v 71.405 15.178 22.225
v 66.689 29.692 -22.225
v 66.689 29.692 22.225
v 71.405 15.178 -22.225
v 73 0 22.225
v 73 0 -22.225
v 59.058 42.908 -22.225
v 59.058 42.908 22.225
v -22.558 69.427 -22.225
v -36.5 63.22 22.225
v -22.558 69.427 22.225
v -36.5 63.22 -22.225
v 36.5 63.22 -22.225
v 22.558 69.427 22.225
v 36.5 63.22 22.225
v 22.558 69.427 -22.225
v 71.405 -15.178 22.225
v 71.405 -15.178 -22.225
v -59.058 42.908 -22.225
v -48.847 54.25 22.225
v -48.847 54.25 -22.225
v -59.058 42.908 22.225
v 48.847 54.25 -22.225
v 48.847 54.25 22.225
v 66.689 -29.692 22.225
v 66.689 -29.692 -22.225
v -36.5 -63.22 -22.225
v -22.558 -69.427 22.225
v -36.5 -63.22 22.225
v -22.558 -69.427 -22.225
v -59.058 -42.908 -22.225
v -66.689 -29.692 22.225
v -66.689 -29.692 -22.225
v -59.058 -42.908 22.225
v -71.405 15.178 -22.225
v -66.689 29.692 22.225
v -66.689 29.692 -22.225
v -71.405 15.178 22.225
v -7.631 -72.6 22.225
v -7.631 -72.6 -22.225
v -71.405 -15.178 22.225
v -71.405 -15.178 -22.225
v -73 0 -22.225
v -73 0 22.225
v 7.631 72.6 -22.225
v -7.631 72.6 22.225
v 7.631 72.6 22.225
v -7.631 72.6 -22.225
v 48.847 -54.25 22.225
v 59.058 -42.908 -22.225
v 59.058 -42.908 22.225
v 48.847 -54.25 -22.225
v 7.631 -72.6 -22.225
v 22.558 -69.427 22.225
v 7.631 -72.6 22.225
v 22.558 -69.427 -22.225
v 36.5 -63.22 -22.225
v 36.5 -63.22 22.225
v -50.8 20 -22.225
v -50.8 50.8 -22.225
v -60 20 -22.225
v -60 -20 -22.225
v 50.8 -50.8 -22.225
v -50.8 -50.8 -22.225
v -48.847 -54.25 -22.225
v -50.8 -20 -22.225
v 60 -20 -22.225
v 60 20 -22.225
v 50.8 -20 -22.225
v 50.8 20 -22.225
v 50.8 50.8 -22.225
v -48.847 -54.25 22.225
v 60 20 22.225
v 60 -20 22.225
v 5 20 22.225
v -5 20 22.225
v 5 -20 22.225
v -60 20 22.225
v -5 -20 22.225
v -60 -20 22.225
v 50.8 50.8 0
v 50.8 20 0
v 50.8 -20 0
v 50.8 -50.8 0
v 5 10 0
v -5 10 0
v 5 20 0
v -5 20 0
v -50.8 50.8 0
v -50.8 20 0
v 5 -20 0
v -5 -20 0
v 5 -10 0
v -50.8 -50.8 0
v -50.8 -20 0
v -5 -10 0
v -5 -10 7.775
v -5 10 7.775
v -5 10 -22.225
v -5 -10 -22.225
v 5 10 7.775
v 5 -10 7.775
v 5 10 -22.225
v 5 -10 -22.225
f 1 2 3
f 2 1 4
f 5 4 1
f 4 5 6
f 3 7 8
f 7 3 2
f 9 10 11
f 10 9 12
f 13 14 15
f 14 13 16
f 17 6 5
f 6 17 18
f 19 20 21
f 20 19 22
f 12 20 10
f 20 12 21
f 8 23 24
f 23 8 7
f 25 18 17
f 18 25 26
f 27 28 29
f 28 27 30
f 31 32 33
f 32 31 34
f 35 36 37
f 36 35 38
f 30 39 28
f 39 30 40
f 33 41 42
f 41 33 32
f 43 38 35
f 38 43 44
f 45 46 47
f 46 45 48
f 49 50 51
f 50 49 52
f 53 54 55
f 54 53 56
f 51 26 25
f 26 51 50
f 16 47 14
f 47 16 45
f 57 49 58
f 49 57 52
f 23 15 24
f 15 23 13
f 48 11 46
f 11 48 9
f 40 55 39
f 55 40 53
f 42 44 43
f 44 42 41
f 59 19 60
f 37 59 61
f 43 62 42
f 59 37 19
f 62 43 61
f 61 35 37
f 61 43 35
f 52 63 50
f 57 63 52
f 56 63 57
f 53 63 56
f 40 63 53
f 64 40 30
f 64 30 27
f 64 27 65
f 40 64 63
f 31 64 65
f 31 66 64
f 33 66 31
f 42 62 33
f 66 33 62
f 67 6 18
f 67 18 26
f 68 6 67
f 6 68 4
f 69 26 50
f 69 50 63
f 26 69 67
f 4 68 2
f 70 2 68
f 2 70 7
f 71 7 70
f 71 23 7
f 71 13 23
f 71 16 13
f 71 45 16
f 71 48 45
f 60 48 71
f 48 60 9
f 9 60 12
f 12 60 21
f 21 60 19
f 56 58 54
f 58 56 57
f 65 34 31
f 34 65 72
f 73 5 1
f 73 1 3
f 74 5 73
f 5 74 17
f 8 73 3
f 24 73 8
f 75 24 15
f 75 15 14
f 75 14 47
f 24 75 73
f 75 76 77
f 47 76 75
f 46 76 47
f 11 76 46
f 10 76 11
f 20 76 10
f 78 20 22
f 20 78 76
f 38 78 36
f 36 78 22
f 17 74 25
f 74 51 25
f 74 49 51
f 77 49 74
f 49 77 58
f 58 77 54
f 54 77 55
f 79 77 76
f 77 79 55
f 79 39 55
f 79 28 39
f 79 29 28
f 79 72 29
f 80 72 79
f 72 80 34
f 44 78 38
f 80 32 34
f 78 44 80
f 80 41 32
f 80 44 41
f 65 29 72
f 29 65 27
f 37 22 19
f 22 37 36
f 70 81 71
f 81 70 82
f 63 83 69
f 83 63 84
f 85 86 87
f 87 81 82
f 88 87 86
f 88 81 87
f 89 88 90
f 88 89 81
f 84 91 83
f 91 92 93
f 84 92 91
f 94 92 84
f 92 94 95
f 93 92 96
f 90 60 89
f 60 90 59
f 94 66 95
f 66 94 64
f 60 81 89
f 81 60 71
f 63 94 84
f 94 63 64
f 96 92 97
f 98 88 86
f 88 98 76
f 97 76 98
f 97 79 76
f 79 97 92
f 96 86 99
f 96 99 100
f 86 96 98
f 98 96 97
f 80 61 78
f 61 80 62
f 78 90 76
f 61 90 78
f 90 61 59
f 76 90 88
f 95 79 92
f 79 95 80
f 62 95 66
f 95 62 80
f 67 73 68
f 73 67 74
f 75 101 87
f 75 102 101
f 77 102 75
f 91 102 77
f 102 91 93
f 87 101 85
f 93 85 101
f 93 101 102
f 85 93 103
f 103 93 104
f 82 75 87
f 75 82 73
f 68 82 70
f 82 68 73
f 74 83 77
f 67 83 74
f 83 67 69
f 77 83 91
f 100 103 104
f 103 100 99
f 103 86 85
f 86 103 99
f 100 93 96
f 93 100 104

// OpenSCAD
//main body
difference(){
    
    cylinder(44.45,73,73,true);
    // square hole in middle
    translate([0,0,-22.225])
        cube([101.6,101.6,44.45], true);
    //square extension L
    translate([-60, -20, -44.45])
    cube([55,40,88.9], false);
    //square extension R
    translate([5, -20, -44.45])
        cube([55,40,88.9], false);
    //another hole in the middle
    //cube([70,50,45], true);
    /*hole 1 in corner
    translate([-38, -38, 0])
        cylinder(500, 12, 12, true);
    //hole 2 in corner
    translate([-38, 38, 0])
        cylinder(500, 12, 12, true);
    //hole 3 in corner
    translate([38, -38, 0])
        cylinder(500, 12, 12, true);
    //hole 4 in corner
    translate([38, 38, 0])
        cylinder(500, 12, 12, true);*/
}
//center motor mounter
translate([-5, -10, -22.225])
    cube([10, 20, 30], false);
/*main motor left
rotate([0,90,0])
    translate([15, 0, -25.45])
cylinder(40.9, 8, 8, true);
//main motor right
rotate([0,90,0])
    translate([15, 0, 25.45])
cylinder(40.9, 8, 8, true);
/*motor turnything left
rotate([90,0,0])
    translate([0,-75, -185]) 
    cylinder(40, 10, 10, $fn=6, true);
//motor turnything right
rotate([90,0,0])
    translate([0,-75, 185]) 
    cylinder(40, 10, 10, $fn=6, true);
//wheel left
rotate([0, 90, 0])
    translate([15, 0, -51])
    cylinder(11.303, 19.05, 19.05, true);
//wheel left
rotate([0, 90, 0])
    translate([15, 0, 51])
    cylinder(11.303, 19.05, 19.05, true);
//caster
rotate([0, 90, 0])
    translate([15, 31, 0])
    cylinder(11.303, 19.05, 19.05, true);
//controller
    translate([0,0,44.45])
        cube([101.6,101.6,44.45], true);
//ir sensor FL
rotate([0,0,45])
translate([-5, 75, 20])
    cube([20, 5, 40], true);
//ir sensor FR
rotate([0,0,-45])
translate([5, 75, 20])
    cube([20, 5, 40], true);
//ir sensor F
translate([0, 75, 20])
    cube([20, 5, 40], true);
//ir sensor L
rotate([0, 0, 90])
    translate([0, 75, 20])
        cube([20, 5, 40], true);
//ir sensor R
rotate([0, 0, 90])
    translate([0, -75, 20])
        cube([20, 5, 40], true);*/
